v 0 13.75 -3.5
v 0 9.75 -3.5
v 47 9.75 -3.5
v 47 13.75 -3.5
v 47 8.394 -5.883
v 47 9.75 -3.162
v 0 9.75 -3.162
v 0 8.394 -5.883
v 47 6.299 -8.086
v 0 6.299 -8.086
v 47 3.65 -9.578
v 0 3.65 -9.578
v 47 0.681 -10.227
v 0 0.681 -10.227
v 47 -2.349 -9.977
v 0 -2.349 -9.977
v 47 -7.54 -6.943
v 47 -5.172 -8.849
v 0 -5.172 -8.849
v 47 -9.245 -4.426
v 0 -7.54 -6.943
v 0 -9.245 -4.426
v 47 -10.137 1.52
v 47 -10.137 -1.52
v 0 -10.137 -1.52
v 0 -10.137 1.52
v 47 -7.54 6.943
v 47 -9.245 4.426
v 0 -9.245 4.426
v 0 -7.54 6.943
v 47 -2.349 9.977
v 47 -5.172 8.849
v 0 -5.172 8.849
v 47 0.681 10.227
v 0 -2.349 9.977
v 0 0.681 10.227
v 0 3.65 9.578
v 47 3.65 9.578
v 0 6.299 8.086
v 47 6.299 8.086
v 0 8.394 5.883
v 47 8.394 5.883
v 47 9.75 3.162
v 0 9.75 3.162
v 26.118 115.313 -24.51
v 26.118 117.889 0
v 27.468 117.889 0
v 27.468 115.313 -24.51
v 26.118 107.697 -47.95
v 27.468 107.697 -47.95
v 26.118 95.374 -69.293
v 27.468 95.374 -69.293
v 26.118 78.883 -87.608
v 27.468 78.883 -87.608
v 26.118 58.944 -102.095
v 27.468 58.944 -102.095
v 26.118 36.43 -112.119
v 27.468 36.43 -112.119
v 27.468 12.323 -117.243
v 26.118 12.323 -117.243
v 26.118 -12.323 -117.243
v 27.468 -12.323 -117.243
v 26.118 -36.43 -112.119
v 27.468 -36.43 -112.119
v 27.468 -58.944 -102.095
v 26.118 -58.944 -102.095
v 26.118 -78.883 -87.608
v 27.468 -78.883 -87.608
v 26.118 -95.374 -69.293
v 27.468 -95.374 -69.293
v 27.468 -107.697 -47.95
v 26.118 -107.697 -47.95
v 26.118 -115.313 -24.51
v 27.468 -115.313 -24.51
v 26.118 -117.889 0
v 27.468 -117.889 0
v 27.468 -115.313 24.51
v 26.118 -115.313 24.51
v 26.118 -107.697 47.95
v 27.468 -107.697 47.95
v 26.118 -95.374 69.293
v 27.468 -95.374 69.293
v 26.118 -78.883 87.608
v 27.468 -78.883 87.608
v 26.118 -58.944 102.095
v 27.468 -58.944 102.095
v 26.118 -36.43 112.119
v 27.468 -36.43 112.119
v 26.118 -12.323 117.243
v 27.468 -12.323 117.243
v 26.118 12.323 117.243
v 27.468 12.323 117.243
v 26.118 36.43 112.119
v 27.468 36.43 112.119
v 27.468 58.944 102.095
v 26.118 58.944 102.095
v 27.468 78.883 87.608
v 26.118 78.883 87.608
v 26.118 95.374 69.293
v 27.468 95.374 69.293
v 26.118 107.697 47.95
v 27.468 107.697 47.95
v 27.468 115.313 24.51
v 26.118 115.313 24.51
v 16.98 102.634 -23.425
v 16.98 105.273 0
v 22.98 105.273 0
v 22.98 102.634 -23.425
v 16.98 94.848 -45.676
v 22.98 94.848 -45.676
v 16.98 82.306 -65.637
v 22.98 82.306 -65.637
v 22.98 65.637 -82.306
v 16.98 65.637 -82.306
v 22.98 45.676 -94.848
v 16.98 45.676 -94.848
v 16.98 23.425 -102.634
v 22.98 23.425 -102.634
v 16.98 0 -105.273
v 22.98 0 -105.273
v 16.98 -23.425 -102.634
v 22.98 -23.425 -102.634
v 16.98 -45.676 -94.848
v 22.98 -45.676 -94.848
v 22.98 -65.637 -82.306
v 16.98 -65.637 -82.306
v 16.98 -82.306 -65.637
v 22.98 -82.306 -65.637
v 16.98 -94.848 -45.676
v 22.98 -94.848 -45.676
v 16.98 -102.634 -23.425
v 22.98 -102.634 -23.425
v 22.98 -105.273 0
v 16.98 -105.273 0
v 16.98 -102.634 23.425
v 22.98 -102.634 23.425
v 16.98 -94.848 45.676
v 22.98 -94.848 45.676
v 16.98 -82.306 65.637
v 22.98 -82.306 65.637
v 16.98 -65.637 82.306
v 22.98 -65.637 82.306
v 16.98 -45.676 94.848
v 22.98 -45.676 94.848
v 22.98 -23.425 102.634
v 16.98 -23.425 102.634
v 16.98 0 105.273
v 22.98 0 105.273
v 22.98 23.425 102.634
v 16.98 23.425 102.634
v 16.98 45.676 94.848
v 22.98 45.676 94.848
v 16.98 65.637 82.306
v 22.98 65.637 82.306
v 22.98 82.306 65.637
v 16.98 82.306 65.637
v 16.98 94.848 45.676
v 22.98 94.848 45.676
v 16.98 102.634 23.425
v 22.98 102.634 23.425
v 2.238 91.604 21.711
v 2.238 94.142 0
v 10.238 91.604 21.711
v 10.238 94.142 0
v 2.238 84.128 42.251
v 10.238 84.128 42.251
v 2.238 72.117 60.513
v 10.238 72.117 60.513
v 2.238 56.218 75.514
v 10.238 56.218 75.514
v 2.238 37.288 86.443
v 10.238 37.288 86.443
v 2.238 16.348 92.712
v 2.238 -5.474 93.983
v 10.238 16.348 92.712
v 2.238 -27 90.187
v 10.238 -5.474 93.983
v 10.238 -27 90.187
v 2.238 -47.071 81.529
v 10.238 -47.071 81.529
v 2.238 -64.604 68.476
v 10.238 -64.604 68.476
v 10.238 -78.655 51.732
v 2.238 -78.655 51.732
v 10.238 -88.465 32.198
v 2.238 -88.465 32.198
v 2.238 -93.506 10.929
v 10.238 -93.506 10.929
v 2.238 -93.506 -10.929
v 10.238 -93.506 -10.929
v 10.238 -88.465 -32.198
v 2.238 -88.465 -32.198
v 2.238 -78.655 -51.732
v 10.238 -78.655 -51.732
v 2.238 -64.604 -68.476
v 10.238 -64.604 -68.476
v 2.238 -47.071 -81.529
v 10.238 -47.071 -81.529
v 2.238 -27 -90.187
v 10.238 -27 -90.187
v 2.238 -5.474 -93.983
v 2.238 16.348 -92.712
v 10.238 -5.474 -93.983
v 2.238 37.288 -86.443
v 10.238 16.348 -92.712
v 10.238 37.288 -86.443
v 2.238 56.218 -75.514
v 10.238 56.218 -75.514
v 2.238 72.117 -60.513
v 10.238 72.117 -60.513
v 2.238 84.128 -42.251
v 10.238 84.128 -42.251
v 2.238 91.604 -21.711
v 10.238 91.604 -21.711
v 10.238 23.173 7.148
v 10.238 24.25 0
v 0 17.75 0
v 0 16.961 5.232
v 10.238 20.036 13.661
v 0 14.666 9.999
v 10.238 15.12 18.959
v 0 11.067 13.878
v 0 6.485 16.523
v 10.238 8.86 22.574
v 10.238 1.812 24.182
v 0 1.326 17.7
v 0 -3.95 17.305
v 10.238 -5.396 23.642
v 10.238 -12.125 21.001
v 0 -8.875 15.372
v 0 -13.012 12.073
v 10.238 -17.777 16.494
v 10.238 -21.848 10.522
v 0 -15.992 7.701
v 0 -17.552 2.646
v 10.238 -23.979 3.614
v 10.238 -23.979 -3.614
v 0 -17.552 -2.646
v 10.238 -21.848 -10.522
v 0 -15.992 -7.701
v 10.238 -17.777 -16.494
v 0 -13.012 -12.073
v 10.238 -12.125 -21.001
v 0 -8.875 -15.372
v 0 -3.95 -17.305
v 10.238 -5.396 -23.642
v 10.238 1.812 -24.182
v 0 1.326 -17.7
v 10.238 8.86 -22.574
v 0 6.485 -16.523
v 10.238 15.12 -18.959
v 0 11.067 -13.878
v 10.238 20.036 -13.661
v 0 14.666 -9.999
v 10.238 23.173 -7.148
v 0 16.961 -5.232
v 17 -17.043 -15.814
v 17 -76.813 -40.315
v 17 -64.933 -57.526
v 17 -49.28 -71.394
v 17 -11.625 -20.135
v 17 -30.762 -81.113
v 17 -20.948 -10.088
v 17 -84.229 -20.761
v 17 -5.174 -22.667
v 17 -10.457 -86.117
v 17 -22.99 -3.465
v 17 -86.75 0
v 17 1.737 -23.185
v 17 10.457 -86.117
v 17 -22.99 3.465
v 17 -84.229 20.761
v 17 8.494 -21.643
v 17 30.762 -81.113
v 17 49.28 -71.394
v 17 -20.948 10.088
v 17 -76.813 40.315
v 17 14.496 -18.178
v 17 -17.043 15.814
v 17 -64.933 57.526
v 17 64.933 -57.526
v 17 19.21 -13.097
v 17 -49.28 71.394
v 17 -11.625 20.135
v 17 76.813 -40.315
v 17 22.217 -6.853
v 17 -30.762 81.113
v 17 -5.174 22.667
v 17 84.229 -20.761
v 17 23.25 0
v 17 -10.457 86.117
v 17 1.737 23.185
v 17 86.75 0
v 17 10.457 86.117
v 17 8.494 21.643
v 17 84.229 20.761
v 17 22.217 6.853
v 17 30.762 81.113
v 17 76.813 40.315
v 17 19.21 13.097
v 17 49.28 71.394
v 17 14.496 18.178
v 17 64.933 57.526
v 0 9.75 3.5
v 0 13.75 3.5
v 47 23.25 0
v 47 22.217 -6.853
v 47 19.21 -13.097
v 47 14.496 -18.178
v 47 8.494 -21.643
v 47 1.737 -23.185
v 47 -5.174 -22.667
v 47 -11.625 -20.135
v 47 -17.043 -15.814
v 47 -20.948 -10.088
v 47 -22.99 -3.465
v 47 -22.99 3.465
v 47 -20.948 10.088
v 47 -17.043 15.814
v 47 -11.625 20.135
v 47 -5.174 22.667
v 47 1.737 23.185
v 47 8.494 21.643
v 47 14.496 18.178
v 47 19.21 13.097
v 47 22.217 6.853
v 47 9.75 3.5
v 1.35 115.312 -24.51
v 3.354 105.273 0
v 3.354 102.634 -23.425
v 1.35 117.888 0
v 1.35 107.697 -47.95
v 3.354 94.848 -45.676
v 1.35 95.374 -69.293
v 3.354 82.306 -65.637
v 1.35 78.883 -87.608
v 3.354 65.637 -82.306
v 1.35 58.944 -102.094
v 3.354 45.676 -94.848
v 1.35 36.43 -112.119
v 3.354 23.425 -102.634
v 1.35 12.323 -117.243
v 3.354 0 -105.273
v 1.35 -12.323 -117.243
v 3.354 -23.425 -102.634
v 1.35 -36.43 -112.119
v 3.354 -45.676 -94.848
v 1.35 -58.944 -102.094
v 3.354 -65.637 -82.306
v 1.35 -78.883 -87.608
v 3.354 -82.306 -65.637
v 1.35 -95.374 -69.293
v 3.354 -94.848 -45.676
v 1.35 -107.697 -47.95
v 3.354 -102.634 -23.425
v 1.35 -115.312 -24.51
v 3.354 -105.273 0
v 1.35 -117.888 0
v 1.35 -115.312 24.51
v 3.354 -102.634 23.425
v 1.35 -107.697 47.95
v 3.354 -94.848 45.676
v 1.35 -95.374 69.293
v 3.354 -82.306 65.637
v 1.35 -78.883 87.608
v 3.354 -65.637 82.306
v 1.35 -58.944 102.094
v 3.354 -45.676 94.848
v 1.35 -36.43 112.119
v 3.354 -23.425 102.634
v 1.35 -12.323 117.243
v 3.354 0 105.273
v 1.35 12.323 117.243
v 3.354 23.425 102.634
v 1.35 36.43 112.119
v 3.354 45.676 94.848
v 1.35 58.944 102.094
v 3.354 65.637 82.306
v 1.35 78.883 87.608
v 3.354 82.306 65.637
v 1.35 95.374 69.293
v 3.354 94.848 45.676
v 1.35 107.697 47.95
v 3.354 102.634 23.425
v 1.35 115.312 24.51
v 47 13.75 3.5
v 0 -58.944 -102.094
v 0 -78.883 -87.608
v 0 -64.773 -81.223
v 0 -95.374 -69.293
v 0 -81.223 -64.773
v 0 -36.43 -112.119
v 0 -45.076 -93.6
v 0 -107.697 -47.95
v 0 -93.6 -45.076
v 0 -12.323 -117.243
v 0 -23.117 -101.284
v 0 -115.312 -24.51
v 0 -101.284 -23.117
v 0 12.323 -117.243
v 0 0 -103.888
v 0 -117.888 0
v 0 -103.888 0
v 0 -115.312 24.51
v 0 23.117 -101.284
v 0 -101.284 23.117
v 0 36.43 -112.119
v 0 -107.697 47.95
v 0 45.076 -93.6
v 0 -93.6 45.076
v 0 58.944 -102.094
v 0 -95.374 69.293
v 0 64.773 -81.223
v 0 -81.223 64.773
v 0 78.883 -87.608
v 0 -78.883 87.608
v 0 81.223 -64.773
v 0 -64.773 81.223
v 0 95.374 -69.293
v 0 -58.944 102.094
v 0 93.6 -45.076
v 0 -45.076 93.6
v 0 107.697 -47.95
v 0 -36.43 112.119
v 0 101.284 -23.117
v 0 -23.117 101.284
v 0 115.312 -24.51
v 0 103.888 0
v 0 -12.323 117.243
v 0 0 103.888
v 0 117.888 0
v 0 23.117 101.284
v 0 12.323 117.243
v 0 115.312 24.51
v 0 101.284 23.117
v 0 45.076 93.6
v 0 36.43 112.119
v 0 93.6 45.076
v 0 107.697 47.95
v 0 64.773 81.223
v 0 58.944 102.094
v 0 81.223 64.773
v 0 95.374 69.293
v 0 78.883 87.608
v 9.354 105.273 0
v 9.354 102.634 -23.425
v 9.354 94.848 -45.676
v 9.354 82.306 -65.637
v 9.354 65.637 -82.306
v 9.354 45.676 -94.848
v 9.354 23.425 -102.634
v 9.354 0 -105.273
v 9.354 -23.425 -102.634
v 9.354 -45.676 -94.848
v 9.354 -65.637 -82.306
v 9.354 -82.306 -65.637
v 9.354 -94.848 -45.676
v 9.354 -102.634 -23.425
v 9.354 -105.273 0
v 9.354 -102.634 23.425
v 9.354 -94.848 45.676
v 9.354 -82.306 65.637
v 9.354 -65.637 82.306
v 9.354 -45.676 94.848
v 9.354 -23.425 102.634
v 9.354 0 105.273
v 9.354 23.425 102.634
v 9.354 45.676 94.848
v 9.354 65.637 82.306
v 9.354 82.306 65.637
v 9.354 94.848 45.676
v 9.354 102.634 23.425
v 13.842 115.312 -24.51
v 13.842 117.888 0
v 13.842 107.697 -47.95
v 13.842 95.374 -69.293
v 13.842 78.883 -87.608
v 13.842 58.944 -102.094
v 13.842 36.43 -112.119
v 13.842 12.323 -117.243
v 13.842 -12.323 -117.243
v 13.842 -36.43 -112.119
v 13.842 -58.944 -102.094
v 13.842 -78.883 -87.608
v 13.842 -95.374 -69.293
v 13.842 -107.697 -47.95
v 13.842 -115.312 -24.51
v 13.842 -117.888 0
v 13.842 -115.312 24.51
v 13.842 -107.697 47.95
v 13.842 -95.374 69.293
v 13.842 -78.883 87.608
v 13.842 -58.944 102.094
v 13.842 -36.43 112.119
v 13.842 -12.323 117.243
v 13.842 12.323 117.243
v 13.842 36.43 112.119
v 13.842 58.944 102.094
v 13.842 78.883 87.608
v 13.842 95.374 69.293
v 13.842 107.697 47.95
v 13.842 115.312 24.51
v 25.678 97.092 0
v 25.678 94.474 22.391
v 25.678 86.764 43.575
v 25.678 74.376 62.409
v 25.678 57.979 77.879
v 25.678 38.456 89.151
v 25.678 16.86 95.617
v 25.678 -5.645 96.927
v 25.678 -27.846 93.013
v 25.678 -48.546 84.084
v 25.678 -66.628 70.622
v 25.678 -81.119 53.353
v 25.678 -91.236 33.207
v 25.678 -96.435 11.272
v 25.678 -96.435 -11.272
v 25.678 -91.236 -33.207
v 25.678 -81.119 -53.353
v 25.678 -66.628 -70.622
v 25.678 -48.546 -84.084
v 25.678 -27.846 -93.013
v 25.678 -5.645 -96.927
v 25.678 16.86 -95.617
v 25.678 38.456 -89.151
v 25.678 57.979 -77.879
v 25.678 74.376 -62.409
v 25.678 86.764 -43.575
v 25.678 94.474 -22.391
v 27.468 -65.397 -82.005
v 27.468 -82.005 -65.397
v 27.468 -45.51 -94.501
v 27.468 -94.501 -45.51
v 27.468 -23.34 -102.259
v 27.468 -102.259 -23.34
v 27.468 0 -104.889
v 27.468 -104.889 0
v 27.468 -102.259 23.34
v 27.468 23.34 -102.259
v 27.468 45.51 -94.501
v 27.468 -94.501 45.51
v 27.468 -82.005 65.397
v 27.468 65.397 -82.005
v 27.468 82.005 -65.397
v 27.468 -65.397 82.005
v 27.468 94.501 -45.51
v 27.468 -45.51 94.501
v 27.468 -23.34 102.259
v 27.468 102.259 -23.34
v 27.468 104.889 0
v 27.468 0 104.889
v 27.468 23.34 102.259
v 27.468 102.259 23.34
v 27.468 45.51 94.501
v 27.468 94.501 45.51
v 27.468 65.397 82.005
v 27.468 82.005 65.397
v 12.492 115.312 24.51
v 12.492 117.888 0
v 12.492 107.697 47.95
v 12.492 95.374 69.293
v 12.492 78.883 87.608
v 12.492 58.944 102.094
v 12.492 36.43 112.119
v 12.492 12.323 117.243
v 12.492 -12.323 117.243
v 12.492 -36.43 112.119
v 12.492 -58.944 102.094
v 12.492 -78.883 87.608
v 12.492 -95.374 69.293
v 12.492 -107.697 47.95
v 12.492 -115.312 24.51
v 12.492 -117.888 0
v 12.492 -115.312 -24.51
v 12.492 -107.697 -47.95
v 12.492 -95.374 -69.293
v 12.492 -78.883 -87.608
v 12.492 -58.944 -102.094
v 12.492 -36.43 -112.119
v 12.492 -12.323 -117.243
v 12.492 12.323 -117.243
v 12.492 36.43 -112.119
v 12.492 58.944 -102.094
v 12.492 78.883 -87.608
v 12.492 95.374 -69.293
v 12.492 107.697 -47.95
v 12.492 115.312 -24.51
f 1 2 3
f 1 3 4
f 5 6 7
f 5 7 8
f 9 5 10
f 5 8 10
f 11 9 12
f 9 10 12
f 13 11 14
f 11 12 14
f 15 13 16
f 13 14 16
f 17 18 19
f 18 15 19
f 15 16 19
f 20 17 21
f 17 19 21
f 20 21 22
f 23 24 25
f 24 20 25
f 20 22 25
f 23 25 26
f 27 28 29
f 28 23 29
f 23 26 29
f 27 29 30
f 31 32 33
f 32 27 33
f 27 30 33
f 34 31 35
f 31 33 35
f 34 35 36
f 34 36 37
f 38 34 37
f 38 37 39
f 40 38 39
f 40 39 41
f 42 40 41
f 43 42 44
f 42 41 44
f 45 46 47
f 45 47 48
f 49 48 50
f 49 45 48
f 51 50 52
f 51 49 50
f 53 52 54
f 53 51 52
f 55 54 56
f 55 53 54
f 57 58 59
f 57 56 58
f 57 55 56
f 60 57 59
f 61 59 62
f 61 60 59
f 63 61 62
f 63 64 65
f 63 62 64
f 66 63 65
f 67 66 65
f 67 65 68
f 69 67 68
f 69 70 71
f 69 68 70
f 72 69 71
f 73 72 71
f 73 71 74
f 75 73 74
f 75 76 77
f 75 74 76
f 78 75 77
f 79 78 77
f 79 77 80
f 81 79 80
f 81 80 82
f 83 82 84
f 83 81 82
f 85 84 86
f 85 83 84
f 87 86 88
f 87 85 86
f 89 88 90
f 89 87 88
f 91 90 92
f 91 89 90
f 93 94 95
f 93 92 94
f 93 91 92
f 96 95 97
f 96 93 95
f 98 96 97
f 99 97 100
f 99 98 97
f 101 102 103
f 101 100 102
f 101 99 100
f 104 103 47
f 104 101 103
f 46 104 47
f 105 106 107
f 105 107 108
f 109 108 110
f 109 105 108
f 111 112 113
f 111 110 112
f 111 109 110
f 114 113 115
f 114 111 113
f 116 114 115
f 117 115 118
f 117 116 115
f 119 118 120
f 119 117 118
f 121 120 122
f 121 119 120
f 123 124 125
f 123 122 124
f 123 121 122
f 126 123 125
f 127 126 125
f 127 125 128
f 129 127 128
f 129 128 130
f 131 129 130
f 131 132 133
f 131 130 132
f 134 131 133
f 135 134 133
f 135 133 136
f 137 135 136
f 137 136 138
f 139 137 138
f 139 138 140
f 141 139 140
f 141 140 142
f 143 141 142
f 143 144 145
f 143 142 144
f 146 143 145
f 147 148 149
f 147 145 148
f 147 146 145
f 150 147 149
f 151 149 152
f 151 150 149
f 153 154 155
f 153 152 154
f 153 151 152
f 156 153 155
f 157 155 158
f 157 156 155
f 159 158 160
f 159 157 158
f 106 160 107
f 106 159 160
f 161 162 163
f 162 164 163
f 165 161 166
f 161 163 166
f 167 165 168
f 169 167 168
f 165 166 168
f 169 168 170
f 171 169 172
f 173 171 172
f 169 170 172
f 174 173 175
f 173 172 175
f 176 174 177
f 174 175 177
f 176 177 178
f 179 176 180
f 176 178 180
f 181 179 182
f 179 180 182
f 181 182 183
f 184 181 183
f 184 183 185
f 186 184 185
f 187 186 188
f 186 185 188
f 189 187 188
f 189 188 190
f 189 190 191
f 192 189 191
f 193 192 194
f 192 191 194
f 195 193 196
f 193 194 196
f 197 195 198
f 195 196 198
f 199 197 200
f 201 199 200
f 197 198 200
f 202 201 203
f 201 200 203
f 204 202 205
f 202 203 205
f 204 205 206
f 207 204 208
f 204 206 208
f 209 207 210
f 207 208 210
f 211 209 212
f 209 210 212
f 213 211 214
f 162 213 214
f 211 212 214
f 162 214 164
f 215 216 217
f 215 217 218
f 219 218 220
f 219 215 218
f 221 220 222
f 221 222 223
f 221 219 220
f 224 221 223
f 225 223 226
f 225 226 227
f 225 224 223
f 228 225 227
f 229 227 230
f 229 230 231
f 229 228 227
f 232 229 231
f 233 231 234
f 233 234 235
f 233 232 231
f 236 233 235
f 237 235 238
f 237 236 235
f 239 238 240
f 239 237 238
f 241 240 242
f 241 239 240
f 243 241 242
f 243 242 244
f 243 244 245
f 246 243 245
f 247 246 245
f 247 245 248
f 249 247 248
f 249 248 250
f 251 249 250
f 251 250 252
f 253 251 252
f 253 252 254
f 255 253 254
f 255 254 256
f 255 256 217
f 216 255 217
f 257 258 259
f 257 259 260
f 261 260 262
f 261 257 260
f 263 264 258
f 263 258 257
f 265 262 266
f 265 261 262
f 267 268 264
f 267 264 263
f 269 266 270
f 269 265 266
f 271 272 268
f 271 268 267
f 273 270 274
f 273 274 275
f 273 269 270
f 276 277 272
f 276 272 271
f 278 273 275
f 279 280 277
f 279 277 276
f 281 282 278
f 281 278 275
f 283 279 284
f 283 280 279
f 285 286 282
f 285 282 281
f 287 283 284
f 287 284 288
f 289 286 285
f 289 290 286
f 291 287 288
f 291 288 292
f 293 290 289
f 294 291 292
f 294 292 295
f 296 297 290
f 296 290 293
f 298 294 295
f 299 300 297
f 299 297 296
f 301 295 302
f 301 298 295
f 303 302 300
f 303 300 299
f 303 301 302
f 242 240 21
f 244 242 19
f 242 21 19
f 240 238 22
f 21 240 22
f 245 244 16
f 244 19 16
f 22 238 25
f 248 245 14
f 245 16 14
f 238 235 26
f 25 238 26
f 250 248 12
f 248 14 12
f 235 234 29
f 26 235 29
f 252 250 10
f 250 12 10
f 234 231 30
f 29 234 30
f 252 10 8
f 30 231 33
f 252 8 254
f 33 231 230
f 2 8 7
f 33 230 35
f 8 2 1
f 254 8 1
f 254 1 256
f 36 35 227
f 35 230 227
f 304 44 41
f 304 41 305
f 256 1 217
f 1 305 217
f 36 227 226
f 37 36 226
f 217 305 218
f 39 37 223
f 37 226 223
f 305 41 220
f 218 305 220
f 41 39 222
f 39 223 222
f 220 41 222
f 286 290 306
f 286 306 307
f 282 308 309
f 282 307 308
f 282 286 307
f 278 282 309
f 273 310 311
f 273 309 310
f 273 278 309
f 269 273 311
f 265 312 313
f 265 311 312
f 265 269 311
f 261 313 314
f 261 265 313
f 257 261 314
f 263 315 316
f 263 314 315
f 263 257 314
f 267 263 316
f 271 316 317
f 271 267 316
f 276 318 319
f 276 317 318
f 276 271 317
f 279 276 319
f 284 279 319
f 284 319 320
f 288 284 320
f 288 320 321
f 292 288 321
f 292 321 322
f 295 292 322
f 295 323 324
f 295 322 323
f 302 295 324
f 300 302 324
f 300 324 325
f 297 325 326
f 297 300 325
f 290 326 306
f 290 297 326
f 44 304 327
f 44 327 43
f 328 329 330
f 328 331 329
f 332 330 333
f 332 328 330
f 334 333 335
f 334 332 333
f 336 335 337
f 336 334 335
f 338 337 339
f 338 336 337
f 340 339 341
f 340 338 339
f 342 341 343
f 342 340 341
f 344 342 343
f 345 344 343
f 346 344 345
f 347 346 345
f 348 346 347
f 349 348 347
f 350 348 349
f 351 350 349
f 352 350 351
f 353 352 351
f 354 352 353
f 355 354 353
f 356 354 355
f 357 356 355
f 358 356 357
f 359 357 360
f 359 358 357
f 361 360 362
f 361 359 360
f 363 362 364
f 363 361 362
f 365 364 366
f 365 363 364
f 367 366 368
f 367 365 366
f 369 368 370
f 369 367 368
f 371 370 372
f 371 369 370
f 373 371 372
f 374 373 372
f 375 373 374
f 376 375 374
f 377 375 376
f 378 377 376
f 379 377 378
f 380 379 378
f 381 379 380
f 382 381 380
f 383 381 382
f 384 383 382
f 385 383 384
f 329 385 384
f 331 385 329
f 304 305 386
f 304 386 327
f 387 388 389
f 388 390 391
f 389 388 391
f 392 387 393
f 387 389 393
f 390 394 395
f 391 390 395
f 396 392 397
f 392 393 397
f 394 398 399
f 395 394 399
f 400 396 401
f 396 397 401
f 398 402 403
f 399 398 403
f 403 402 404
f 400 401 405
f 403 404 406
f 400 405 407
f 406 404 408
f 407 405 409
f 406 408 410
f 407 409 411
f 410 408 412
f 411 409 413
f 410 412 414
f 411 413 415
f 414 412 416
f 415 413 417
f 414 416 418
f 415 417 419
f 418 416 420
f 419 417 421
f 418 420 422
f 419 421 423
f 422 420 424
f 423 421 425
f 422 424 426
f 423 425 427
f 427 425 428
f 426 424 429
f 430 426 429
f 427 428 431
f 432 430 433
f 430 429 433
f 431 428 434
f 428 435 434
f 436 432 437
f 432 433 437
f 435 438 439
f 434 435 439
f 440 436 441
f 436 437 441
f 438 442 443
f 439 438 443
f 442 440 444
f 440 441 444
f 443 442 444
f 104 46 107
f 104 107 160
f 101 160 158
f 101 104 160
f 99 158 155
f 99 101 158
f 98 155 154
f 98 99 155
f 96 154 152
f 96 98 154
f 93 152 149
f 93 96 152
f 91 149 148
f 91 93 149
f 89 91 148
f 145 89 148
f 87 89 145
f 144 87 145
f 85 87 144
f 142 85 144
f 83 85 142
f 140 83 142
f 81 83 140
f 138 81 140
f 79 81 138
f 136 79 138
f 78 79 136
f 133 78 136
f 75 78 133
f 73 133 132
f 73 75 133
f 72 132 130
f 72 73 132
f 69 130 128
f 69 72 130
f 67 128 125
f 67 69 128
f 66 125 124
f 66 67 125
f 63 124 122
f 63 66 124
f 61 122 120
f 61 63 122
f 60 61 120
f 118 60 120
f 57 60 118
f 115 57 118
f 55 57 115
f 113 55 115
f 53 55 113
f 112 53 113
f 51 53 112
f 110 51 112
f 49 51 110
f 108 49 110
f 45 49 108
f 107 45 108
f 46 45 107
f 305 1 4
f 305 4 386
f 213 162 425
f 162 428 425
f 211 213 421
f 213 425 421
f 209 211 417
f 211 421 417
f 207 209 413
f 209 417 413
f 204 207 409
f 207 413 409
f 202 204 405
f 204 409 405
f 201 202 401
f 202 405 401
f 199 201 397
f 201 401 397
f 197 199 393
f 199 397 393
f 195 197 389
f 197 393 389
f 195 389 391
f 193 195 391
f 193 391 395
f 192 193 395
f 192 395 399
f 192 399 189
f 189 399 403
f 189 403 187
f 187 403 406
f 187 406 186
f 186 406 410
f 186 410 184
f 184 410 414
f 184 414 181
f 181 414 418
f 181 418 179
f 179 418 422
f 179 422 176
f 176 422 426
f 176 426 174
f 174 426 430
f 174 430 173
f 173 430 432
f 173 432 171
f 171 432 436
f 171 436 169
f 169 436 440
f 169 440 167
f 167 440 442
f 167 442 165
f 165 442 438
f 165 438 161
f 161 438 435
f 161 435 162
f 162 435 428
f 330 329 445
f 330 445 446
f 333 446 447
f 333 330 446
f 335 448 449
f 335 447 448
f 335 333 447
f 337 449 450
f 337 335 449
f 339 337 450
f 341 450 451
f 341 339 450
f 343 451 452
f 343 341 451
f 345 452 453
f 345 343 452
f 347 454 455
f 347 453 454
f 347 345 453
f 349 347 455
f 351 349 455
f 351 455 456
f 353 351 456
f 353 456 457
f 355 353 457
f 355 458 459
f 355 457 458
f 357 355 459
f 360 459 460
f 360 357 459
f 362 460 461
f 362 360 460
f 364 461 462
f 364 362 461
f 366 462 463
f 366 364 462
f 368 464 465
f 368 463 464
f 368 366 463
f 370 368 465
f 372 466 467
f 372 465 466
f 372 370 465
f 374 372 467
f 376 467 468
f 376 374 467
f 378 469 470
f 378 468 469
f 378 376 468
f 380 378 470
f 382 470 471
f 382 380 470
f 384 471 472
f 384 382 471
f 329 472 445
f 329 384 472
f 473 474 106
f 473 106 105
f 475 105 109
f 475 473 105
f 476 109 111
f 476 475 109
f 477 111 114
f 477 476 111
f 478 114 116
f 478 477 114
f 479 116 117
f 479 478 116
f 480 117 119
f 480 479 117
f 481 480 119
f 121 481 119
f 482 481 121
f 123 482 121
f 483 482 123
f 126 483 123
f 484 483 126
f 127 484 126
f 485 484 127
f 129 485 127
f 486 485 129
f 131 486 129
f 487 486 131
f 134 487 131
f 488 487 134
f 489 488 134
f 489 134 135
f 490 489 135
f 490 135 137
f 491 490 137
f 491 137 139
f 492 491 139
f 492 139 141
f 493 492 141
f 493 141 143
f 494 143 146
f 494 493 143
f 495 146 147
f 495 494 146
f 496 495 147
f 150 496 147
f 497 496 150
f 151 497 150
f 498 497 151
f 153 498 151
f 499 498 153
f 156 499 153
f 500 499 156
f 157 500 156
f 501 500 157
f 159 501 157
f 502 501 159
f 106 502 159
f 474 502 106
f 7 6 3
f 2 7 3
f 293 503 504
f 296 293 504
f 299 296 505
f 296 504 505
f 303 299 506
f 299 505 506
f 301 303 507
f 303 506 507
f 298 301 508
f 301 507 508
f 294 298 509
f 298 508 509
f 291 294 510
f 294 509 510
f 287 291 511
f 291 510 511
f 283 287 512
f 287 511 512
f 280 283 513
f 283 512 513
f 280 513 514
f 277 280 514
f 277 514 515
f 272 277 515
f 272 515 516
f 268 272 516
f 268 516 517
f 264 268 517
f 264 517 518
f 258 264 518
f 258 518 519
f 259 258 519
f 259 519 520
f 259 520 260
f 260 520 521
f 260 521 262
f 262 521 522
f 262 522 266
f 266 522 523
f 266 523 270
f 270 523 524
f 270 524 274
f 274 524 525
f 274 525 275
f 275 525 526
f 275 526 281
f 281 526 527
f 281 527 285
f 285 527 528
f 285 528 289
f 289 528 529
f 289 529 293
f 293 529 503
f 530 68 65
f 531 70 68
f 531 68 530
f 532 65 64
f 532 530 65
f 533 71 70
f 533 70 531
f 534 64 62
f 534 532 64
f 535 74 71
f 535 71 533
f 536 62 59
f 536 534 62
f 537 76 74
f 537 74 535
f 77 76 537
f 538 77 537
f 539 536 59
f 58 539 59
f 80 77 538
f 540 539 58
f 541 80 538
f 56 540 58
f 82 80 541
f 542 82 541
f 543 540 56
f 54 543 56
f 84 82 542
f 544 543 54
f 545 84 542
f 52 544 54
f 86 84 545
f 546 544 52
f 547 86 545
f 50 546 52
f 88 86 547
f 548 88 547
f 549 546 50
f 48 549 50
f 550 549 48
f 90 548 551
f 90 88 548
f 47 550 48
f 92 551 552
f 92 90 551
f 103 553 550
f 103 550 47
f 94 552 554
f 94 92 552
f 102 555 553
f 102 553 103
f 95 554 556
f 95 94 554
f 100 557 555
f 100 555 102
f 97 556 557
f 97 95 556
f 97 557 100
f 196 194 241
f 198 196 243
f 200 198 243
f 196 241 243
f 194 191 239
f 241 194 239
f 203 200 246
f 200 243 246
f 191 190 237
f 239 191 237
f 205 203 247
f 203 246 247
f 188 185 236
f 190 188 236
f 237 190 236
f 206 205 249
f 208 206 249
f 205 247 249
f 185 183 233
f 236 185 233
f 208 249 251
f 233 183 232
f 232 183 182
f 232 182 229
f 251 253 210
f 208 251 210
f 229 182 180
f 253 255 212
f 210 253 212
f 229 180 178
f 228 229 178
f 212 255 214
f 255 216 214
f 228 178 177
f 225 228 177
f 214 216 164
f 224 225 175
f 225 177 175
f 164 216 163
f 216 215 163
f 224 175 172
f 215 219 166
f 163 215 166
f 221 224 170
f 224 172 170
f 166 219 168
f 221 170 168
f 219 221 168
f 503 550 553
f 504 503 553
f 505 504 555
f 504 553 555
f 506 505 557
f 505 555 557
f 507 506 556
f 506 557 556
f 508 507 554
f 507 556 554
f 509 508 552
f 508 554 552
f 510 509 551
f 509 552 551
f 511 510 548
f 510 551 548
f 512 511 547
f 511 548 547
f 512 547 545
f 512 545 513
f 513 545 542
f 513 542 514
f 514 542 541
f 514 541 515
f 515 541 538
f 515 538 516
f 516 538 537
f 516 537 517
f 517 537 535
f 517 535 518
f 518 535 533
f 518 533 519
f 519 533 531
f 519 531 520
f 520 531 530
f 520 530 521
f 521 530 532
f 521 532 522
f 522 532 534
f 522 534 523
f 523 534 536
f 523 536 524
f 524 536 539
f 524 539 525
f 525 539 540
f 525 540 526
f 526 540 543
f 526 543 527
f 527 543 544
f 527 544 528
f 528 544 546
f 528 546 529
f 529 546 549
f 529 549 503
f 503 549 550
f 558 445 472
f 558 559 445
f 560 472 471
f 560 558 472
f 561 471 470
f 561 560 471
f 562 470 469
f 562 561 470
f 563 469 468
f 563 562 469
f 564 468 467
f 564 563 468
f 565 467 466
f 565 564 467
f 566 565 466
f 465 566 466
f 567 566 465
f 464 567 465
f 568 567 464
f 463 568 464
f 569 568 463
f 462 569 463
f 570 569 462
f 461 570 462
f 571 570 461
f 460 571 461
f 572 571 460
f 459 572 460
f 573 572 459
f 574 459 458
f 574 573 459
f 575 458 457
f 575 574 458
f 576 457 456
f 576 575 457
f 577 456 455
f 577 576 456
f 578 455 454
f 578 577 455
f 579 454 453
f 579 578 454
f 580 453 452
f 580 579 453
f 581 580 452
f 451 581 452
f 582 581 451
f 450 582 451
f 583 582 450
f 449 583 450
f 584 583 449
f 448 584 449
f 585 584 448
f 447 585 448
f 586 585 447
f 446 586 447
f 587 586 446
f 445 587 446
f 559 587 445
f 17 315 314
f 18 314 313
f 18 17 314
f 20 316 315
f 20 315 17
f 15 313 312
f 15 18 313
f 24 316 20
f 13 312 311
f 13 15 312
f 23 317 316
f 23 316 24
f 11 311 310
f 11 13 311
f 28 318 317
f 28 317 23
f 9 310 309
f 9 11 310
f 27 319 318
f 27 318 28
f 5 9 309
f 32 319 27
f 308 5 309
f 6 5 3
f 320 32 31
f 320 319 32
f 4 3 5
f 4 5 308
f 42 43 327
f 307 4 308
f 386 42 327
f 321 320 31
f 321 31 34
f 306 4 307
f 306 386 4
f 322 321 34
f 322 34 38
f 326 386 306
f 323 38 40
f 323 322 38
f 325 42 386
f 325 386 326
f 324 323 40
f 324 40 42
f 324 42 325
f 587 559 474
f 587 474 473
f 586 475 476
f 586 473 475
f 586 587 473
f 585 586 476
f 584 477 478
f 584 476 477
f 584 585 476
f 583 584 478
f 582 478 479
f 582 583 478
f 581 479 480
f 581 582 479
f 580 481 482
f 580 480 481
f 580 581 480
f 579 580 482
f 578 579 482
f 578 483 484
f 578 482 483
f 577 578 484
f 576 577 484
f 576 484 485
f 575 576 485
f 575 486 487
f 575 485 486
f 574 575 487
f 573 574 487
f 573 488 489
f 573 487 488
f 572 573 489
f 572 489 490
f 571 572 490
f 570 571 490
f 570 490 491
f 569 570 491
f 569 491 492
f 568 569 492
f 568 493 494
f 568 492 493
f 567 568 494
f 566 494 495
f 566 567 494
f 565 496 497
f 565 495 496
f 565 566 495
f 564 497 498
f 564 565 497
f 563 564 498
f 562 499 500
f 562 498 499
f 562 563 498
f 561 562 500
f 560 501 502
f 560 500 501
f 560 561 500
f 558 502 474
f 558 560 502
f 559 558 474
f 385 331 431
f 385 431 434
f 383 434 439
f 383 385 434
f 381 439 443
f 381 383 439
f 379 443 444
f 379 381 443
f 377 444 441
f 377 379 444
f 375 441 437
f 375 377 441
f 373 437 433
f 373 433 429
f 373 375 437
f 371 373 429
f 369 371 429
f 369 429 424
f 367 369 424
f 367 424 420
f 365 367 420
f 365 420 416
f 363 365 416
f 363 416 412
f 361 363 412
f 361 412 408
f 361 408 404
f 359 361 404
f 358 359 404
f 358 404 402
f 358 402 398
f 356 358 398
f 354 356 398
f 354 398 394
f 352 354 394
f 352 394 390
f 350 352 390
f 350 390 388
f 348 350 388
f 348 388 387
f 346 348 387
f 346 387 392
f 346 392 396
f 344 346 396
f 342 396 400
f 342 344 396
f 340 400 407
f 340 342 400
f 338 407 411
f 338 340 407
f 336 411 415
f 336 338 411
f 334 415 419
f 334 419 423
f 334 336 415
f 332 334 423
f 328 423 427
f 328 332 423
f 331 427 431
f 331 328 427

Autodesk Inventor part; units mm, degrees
ref_plane "YZ Plane" through (0, 0, 0) normal (1, 0, 0) x (0, 1, 0)
ref_plane "XZ Plane" through (0, 0, 0) normal (0, 1, 0) x (-1, 0, 0)
ref_plane "XY Plane" through (0, 0, 0) normal (0, 0, 1) x (1, 0, 0)
sketch "Sketch1" plane through (0, 0, 0) normal (0, 0, 1) x (1, 0, 0)
  line L0 (0, 0) -> (47, 0)
  line L1 (47, 10.25) -> (0, 10.25)
  line L2 (0, 10.25) -> (0, 17.75)
  line L3 (47, 10.25) -> (47, 23.25)
  line L4 (47, 23.25) -> (17, 23.25)
  line L5 (17, 23.25) -> (17, 86.75)
  line L6 (17, 86.75) -> (25.6776, 97.0916)
  line L7 (25.6776, 97.0916) -> (27.4678, 104.8887)
  line L8 (27.4678, 104.8887) -> (27.4678, 117.8887)
  line L9 (27.4678, 117.8887) -> (26.1178, 117.8887)
  line L10 (26.1178, 117.8887) -> (22.9803, 105.273)
  line L11 (22.9803, 105.273) -> (16.9803, 105.273)
  line L12 (16.9803, 105.273) -> (13.8419, 117.8885)
  line L13 (13.8419, 117.8885) -> (12.4919, 117.8885)
  line L14 (12.4919, 117.8885) -> (9.3536, 105.273)
  line L15 (9.3536, 105.273) -> (3.3536, 105.273)
  line L16 (0, 117.8885) -> (1.35, 117.8885)
  line L17 (1.35, 117.8885) -> (3.3536, 105.273)
  line L18 (0, 117.8885) -> (0, 103.8885)
  line L19 (0, 103.8885) -> (2.2376, 94.1421)
  line L20 (2.2376, 94.1421) -> (10.2376, 94.1421)
  line L21 (0, 17.75) -> (10.2376, 24.25)
  line L22 (10.2376, 94.1421) -> (10.2376, 24.25)
  dimension "d0" = 47
  dimension "d1" = 10.25
  dimension "d3" = 7.5
  dimension "d4" = 13
  dimension "d27" = 30
  dimension "d28" = 63.5
  dimension "d34" = 13.5
  dimension "d35" = 140
  dimension "d36" = 8
  dimension "d37" = 13
  dimension "d38" = 1.35
  dimension "d39" = 13
  dimension "d40" = 4.4875
  dimension "d41" = 6
  dimension "d42" = 13
  dimension "d43" = 103.97
  dimension "d44" = 1.35
  dimension "d47" = 13
  dimension "d48" = 6
  dimension "d49" = 103.97
  dimension "d51" = 1.35
  dimension "d52" = 14
  dimension "d53" = 10
  dimension "d54" = 167.07
  dimension "d55" = 8
revolve "Revolution1" add sketch "Sketch1" angle 360 about axis through (0, 0, 0) along (1, 0, 0)
sketch "Sketch2" plane through (0, 0, 0) normal (-1, 0, 0) x (0, 0, 1)
  circle A0 centre (0, 0) radius 17.75 projected
  line L0 (-3.5, 13.75) -> (3.5, 13.75)
  line L1 (3.5, 13.75) -> (3.5, 9.75)
  line L2 (3.5, 9.75) -> (-3.5, 9.75)
  line L3 (-3.5, 9.75) -> (-3.5, 13.75)
  dimension "d61" = 7
  dimension "d62" = 4
extrude "Extrusion1" cut sketch "Sketch2" against normal blind 50 contours L0 L1 L2 L3
properties part number "polia final"
